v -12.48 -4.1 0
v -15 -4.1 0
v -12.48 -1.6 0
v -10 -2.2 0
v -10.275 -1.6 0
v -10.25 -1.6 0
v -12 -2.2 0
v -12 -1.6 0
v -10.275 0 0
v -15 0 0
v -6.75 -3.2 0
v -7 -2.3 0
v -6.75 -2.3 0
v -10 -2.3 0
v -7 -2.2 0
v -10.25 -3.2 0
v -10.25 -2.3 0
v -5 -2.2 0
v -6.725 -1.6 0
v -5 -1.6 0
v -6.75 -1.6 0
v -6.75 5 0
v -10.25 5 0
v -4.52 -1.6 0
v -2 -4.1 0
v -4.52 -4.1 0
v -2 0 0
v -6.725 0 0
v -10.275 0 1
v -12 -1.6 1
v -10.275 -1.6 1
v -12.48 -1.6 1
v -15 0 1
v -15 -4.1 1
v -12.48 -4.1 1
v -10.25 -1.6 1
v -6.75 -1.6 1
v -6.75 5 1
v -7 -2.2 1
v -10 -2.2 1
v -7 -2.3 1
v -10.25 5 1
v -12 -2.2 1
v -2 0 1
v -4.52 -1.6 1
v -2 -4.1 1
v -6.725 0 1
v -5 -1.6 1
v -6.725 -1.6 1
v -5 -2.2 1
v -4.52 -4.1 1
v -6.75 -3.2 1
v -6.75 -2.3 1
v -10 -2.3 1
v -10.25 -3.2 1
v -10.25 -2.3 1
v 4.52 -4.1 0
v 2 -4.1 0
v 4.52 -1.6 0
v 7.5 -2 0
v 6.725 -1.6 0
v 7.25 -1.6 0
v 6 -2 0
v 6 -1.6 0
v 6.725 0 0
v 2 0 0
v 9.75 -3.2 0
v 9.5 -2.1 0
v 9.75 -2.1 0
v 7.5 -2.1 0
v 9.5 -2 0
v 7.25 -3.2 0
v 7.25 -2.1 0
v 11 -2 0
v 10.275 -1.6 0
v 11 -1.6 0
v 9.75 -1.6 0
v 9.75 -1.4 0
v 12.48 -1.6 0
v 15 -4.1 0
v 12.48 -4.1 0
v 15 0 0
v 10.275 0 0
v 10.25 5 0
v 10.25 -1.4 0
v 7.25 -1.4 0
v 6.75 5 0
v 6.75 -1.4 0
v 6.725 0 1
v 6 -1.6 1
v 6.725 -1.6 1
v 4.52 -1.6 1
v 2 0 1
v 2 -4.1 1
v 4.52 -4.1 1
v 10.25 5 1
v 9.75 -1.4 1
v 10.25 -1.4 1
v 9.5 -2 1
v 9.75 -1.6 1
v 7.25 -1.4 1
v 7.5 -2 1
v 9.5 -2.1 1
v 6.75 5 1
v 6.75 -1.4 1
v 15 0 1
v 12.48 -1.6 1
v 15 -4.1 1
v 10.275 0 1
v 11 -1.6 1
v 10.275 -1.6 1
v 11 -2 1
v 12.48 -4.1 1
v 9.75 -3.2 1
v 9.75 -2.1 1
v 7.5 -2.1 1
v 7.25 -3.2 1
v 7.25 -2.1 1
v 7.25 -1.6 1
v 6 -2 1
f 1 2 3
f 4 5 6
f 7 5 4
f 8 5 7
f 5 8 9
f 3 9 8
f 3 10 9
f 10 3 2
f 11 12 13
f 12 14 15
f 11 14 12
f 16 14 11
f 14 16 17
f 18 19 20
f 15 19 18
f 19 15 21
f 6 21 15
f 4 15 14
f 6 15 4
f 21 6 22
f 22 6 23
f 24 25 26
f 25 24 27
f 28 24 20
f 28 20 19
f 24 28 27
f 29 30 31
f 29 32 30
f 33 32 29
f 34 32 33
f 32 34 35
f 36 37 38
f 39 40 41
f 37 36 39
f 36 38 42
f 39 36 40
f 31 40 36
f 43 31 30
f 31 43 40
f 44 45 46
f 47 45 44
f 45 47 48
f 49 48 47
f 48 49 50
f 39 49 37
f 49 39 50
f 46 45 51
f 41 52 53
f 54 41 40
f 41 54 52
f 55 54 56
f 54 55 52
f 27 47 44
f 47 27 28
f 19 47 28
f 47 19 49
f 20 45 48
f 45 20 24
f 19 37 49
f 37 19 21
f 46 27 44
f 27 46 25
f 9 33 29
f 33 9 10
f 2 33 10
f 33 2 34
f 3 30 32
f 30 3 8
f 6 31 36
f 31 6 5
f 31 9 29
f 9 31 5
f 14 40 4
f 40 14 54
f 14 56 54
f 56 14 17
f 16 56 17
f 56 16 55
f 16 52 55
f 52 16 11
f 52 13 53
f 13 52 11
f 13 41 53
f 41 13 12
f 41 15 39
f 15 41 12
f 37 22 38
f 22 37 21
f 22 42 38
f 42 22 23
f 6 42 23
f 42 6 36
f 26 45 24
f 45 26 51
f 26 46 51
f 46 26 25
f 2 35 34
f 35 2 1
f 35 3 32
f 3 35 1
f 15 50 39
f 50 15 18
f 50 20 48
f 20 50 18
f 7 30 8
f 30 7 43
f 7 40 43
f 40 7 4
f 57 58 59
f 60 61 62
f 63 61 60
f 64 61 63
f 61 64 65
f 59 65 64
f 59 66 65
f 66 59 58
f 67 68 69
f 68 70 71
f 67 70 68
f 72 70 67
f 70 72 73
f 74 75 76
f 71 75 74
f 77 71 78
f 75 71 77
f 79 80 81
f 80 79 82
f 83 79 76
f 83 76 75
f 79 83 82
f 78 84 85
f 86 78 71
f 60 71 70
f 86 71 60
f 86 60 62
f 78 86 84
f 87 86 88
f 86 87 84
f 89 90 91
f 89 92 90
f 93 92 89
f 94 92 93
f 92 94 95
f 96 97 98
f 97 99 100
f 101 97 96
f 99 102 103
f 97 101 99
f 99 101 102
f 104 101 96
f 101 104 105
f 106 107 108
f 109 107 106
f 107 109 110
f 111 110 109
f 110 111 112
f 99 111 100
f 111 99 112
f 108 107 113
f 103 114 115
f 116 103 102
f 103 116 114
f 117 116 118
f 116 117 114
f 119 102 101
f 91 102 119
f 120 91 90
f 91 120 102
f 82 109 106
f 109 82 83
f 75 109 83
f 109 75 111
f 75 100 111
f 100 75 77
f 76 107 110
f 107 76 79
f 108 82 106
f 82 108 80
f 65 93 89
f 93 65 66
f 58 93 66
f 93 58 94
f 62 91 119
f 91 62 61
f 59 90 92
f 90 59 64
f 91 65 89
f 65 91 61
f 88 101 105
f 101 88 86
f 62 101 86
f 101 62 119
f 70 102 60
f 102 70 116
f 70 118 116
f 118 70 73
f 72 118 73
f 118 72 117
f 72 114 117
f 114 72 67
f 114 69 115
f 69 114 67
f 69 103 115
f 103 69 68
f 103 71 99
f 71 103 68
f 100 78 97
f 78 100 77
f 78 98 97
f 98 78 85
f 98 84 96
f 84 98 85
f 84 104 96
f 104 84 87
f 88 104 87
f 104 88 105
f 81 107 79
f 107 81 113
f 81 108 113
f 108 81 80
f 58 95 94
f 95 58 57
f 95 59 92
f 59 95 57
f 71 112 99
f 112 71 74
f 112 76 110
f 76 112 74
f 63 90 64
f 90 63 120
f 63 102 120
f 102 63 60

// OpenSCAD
// 柱と E リングの留め方 ①段なし / ②基板の裏で細くする ── 断面の作図
// 2026-08-28。3D を切ると preview の色が潰れるので、**断面そのものを平面の図として描く**。
//   横軸 = 柱の中心からの距離、縦軸 = 高さ（基板の上面 = 0）。左右対称なので mirror で写す。
//   実行: openscad --preview -o post_ering.png --projection=ortho \
//         --camera=0,0.9,0,0,0,0,27 --imgsize=1500,480 hardware/_post_ering_study.scad
$fn = 8;

HOLE   = 3.55;   // ✅ 基板の穴（印刷 φ3.5 が通り 3.6 が通らない・2026-08-28）
PCB_T  = 1.6;
POST_D = 3.5;    // ✅ 穴に合う柱
HDR_X  = 3.98;   // ✅ GPO 角で、柱の中心からヘッダの樹脂までの距離（parts.scad の実物合わせ値から）
HDR_T  = 2.5;    // 樹脂の厚み（基板の裏に密着）
THIN_D = 2.5;    // ② で細くする区間
PIN_BOT = -3.2;  // 柱の下端

R3_OD = 7.0; R3_T = 0.6; R3_GRV = 3.0;   // 呼び3（適用軸 3.2〜4）📄
R2_OD = 5.0; R2_T = 0.4; R2_GRV = 2.0;   // 呼び2（適用軸 2.5〜3.2）📄
STEP_UP = 0.2;   // ② で段を穴の中へ引っ込める量

module box(x0, x1, y0, y1) translate([x0, y0]) square([x1 - x0, y1 - y0]);
module sym() { children(); mirror([1, 0, 0]) children(); }

module fig(thin, grv, ring_od, ring_t) {
    // 基板（緑）
    color("#1f7a4d") linear_extrude(1) sym() box(HOLE / 2, 6.5, -PCB_T, 0);
    // 柱（樹脂）
    color("#c9ced6") linear_extrude(1) sym() difference() {
        union() {
            box(0, POST_D / 2, 0, 5);                                   // 柱（上はずっと φ3.5）
            box(0, POST_D / 2, -(PCB_T - (thin ? STEP_UP : 0)), 0);     // 穴を通る区間
            box(0, (thin ? THIN_D : POST_D) / 2, PIN_BOT,
                   -(PCB_T - (thin ? STEP_UP : 0)));                    // その下
        }
        box(grv / 2, 6.5, -PCB_T - ring_t - 0.1, -PCB_T);                 // E リングの溝
    }
    // ヘッダの樹脂（黒。基板の裏に密着して 2.5mm）
    color("#22272e") linear_extrude(1) sym() box(HDR_X, 6.5, -PCB_T - HDR_T, -PCB_T);
    // E リング（鋼）
    color("#3d4a5c") linear_extrude(1) sym() box(grv / 2, ring_od / 2, -PCB_T - ring_t, -PCB_T);
}

translate([-8.5, 0, 0]) fig(false, R3_GRV, R3_OD, R3_T);   // ① 段なし・呼び3
translate([ 8.5, 0, 0]) fig(true,  R2_GRV, R2_OD, R2_T);   // ② 裏で φ2.5・呼び2
